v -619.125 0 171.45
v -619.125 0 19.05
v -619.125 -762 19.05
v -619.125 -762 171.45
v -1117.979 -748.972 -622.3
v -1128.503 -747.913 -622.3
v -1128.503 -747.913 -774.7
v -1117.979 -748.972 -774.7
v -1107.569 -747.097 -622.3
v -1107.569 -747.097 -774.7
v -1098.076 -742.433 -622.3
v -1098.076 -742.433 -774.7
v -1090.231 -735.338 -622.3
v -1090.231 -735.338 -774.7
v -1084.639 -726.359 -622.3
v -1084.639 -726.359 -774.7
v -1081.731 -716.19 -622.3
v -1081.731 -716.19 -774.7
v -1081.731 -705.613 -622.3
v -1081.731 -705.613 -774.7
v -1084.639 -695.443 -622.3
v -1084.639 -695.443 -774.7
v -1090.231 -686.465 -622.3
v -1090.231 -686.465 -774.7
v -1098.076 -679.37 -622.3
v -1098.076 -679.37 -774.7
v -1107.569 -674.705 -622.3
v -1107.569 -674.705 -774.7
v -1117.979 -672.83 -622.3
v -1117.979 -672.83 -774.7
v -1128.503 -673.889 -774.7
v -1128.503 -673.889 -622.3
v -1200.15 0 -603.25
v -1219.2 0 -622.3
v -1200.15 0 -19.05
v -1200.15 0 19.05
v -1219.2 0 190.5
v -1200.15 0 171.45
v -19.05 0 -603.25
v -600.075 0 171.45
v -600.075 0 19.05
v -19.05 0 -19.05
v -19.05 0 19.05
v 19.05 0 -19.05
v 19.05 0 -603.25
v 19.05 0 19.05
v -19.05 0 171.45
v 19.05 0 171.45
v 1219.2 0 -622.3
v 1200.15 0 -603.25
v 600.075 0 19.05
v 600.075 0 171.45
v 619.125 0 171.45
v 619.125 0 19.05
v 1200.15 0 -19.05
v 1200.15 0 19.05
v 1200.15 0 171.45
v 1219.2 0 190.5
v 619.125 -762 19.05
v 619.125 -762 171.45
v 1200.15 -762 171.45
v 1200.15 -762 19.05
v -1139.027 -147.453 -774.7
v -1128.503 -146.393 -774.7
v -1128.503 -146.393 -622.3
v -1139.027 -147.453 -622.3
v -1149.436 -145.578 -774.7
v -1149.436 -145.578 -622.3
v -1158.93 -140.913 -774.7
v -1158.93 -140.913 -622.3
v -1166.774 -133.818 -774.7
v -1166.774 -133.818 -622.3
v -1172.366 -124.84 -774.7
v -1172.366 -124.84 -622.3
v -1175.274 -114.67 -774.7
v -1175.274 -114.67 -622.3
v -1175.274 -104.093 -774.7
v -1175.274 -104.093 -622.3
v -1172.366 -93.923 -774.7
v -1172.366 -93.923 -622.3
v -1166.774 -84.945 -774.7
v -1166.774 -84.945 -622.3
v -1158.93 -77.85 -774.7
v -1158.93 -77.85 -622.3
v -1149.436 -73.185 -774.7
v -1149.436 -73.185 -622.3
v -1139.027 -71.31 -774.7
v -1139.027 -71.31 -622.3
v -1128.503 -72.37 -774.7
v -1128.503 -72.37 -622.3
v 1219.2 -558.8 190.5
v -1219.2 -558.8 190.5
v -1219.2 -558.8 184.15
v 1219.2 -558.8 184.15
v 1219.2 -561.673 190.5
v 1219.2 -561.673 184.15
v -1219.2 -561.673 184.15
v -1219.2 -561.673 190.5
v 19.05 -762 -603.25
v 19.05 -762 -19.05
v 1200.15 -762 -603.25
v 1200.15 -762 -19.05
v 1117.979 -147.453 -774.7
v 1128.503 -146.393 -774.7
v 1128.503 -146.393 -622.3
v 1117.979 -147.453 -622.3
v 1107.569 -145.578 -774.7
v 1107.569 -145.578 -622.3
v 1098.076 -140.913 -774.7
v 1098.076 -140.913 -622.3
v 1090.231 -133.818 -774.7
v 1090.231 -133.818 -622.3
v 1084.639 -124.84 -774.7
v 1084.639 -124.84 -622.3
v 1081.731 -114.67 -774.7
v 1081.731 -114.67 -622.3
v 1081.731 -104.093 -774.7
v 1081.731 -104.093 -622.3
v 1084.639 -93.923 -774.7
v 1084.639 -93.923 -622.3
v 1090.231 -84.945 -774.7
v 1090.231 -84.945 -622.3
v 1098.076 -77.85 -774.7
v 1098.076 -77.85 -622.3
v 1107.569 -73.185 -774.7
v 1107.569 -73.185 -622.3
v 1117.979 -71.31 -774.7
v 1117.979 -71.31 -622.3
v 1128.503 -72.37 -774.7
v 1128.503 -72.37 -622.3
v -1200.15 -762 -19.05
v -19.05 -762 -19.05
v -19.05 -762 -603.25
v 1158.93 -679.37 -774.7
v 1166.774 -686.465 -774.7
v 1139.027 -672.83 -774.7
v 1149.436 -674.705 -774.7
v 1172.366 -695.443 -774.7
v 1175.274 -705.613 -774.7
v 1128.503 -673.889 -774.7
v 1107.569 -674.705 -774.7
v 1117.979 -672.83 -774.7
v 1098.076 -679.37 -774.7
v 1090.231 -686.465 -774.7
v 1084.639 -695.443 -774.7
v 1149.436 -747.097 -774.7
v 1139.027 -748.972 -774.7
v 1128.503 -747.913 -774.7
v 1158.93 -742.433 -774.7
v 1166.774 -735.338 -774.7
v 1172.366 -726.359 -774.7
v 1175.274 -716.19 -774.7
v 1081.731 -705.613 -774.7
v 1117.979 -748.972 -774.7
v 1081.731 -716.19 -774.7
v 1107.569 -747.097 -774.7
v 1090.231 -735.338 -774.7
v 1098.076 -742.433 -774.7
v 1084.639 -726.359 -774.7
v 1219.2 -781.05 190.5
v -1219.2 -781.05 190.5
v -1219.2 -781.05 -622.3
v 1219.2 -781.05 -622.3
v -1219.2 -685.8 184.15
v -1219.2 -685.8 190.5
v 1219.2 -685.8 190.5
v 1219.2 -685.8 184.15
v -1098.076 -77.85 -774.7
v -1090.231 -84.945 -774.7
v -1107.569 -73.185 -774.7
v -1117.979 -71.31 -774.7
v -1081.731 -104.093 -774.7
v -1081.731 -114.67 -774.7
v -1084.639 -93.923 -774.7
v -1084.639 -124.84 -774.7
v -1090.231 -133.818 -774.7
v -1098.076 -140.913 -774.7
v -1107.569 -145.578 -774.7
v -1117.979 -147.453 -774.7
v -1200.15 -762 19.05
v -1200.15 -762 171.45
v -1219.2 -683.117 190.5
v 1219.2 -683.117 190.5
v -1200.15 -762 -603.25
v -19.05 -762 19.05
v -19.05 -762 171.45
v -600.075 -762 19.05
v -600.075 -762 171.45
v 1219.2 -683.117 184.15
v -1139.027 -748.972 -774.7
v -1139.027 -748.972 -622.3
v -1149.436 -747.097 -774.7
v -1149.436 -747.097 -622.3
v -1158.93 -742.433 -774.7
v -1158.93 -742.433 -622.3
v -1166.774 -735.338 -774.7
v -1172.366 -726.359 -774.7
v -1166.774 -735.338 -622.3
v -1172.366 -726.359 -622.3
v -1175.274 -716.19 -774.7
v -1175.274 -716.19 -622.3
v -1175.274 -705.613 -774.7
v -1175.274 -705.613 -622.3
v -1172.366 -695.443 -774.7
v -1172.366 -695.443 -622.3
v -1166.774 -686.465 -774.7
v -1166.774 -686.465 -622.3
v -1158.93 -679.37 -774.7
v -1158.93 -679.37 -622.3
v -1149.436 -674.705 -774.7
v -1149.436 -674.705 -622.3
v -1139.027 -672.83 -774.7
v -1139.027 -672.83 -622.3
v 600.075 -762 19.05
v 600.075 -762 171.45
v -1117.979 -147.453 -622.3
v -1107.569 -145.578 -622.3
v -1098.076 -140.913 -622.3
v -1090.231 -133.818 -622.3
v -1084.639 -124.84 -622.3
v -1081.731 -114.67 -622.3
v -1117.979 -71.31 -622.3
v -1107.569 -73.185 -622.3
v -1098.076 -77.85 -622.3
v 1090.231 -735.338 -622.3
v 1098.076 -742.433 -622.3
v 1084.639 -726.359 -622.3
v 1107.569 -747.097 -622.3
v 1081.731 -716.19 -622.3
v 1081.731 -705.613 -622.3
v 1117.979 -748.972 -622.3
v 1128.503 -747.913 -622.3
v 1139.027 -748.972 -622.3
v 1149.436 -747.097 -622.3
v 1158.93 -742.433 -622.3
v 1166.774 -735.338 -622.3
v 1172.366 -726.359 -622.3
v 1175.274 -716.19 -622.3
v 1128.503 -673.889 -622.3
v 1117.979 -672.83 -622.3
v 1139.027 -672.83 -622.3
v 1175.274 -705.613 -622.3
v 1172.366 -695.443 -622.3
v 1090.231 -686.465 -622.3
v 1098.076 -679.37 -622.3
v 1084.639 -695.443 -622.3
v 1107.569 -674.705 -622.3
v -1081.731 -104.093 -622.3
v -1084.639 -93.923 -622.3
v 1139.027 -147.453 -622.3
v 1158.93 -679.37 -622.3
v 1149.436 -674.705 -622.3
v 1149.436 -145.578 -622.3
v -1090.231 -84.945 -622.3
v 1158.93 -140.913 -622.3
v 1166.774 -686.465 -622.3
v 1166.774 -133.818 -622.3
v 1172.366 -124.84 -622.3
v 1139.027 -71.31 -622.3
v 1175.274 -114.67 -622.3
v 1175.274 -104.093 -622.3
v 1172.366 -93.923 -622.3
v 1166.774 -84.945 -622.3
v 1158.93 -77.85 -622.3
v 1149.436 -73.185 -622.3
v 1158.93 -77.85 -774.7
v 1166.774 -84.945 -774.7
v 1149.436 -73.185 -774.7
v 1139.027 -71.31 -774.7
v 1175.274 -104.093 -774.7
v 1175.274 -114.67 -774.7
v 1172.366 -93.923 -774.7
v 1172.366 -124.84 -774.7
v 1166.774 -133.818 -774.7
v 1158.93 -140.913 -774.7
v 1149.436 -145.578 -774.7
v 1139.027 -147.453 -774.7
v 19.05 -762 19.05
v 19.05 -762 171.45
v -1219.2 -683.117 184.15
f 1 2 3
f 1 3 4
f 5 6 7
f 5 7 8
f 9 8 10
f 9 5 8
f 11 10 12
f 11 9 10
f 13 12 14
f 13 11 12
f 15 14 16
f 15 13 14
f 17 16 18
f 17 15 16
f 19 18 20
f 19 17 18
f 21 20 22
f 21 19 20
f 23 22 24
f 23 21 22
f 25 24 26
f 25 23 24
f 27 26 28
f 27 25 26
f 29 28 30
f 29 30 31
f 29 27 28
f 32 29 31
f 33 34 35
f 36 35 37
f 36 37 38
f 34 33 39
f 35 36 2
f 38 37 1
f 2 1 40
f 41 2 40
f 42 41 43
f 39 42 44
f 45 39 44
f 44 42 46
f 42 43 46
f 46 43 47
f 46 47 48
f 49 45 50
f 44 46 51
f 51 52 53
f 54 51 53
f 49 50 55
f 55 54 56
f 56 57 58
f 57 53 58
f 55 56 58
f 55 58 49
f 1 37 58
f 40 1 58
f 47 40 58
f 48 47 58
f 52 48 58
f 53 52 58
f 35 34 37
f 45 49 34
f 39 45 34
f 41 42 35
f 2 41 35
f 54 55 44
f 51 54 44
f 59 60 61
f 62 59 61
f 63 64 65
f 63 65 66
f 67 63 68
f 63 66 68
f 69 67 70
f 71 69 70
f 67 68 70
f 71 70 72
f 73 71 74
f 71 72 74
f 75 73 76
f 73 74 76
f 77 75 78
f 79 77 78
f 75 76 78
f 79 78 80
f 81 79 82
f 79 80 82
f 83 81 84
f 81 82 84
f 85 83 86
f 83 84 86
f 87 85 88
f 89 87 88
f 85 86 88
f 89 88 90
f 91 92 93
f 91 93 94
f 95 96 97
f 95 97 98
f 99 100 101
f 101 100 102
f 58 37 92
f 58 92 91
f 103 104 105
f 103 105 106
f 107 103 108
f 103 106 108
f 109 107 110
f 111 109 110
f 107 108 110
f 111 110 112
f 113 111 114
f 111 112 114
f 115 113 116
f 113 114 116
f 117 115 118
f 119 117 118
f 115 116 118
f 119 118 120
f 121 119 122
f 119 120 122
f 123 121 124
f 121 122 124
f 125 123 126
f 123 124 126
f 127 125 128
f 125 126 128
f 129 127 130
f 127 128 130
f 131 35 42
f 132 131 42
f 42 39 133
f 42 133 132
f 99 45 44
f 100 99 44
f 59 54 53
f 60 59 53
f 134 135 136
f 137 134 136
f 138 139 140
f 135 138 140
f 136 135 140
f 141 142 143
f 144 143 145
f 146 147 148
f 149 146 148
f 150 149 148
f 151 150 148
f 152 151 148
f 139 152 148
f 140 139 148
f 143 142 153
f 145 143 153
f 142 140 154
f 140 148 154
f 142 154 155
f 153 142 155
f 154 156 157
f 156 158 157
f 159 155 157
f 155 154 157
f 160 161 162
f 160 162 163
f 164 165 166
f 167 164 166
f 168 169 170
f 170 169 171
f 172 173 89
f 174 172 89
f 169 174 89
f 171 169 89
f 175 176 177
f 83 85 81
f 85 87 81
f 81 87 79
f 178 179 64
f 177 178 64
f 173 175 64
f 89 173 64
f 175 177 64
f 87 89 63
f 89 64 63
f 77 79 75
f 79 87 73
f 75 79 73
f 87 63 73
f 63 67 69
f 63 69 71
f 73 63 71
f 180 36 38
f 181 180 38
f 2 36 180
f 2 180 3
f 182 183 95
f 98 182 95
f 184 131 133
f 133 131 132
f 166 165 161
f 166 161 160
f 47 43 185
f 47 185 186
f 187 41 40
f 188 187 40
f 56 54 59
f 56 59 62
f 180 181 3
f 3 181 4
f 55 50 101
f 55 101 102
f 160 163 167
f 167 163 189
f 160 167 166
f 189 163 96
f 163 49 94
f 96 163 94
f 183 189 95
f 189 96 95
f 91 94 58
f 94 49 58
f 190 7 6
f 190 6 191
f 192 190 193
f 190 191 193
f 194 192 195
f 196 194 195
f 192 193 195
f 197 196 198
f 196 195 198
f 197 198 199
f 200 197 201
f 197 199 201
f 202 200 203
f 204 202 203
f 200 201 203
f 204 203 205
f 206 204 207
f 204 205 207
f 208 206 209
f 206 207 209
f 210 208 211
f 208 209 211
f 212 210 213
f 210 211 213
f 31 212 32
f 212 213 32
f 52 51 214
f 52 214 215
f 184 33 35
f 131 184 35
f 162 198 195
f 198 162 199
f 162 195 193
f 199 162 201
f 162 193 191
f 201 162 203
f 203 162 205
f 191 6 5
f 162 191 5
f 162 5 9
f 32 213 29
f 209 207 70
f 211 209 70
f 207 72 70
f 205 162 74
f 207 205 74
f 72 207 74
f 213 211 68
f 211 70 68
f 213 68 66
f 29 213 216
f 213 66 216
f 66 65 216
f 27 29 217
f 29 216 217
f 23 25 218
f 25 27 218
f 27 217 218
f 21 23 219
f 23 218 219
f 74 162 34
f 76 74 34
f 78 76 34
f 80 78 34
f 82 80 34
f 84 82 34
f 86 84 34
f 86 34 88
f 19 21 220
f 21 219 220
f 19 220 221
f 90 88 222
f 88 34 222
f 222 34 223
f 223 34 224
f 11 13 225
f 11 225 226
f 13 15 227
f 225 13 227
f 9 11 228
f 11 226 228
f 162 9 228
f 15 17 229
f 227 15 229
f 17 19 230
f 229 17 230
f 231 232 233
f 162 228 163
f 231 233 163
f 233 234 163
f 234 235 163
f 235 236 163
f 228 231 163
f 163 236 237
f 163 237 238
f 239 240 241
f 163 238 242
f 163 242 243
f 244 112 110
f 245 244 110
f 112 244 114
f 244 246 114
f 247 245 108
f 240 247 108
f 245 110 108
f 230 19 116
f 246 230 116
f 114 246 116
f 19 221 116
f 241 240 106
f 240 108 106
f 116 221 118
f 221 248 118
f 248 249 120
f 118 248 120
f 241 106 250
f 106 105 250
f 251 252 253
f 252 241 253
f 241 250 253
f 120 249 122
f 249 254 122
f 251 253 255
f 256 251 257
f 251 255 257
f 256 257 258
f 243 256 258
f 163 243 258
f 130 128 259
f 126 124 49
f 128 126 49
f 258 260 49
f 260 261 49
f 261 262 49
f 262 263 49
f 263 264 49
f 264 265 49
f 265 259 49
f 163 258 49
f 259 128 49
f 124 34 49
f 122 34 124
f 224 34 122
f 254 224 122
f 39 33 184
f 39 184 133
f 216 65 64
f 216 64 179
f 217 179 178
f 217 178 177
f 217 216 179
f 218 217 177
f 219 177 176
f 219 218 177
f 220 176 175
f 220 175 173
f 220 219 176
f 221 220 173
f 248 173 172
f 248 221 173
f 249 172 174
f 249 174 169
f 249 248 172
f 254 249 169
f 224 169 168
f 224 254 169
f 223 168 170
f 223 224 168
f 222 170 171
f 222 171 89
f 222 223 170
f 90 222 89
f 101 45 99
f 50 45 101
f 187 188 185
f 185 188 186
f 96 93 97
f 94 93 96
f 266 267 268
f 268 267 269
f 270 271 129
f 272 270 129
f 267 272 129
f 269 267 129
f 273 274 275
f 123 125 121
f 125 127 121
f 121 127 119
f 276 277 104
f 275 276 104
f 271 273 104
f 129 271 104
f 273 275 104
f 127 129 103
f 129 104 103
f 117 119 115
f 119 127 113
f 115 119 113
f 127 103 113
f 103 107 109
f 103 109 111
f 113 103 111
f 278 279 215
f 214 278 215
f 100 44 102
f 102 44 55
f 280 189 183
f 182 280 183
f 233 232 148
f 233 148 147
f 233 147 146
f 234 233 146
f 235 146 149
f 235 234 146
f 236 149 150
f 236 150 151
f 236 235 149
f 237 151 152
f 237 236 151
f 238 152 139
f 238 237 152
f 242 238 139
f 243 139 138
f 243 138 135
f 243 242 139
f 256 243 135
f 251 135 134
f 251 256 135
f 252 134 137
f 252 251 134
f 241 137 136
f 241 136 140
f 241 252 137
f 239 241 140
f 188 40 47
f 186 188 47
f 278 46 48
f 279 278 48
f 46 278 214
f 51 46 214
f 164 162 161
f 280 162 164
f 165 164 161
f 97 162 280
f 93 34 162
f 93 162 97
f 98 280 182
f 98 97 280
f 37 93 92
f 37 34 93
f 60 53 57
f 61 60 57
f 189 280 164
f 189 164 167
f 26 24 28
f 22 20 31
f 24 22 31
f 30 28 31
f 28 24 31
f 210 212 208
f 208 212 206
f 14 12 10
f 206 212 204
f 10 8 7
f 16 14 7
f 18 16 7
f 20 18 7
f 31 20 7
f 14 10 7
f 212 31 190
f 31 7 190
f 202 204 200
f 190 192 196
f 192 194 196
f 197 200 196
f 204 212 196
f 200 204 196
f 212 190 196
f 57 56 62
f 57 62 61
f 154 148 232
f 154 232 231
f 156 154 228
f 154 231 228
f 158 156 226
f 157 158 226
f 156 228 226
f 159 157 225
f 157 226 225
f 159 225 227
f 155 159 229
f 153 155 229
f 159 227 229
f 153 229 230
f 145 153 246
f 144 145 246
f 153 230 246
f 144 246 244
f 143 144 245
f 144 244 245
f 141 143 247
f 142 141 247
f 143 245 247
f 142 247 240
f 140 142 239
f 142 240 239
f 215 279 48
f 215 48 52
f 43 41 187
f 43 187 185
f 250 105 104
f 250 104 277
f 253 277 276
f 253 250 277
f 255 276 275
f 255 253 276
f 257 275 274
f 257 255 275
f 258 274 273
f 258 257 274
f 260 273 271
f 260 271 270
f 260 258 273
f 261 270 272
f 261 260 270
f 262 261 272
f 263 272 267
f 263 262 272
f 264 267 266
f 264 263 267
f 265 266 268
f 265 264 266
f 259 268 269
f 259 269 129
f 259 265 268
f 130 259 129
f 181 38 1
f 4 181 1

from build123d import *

# Parameters (mm, degrees)
F0_W      = 1219.2
F0_H      = 190.5
F0_W_2    = 1181.1
F0_H_2    = 152.4
F1_DEPTH  = 762
F2_W      = 1219.2
F2_H      = 190.5
F2_W_2    = 1181.1
F2_H_2    = 152.4
F3_DEPTH  = 762
F4_W      = 1219.2
F4_H      = 622.3
F4_W_2    = 1181.1
F4_H_2    = 584.2
F5_DEPTH  = 762
F6_W      = 1219.2
F6_H      = 622.3
F6_W_2    = 1181.1
F6_H_2    = 584.2
F7_DEPTH  = 762
F8_W      = 2438.4
F8_H      = 127
F9_DEPTH  = 6.35
F10_W     = 2438.4
F10_H     = 812.8
F11_DEPTH = 19.05
F12_R     = 38.1
F13_DEPTH = 152.4
F14_W     = 19.05
F14_H     = 152.4
F15_DEPTH = 762
F17_W     = 121.444046
F17_H     = 6.35
F18_DEPTH = 2438.4


with BuildPart() as f1:
    # F0 (on Front) → F1 (new body)
    with BuildSketch(Plane.XZ):
        with Locations((-609.6, 95.25)):
            Rectangle(F0_W, F0_H)
        with Locations((-609.6, 95.25)):
            Rectangle(F0_W_2, F0_H_2, mode=Mode.SUBTRACT)
    extrude(amount=F1_DEPTH)

    # F2 (on Front) → F3 (join)
    with BuildSketch(Plane.XZ):
        with Locations((609.6, 95.25)):
            Rectangle(F2_W, F2_H)
        with Locations((609.6, 95.25)):
            Rectangle(F2_W_2, F2_H_2, mode=Mode.SUBTRACT)
    extrude(amount=F3_DEPTH)

    # F4 (on Front) → F5 (join)
    with BuildSketch(Plane.XZ):
        with Locations((-609.6, -311.15)):
            Rectangle(F4_W, F4_H)
        with Locations((-609.6, -311.15)):
            Rectangle(F4_W_2, F4_H_2, mode=Mode.SUBTRACT)
    extrude(amount=F5_DEPTH)

    # F6 (on Front) → F7 (join)
    with BuildSketch(Plane.XZ):
        with Locations((609.6, -311.15)):
            Rectangle(F6_W, F6_H)
        with Locations((609.6, -311.15)):
            Rectangle(F6_W_2, F6_H_2, mode=Mode.SUBTRACT)
    extrude(amount=F7_DEPTH)

    # F8 (on face) → F9 (cut)
    with BuildSketch(Plane.XY.offset(190.5)):
        with Locations((0, -622.3)):
            Rectangle(F8_W, F8_H)
    extrude(amount=-F9_DEPTH, mode=Mode.SUBTRACT)

    # F10 (on face) → F11 (join)
    with BuildSketch(Plane.XZ.offset(762)):
        with Locations((0, -215.9)):
            Rectangle(F10_W, F10_H)
    extrude(amount=F11_DEPTH)

    # F12 (on face) → F13 (join)
    with BuildSketch(Plane(origin=(0, 0, -622.3), x_dir=(1, 0, 0), z_dir=(0, 0, -1))):
        with Locations((1119.462132, 109.381564)):
            Circle(F12_R)
        with Locations((-1137.543082, 710.901141)):
            Circle(F12_R)
        with Locations((1119.462132, 710.901141)):
            Circle(F12_R)
        with Locations((-1137.543082, 109.381564)):
            Circle(F12_R)
    extrude(amount=F13_DEPTH)

    # F14 (on face) → F15 (join, through all)
    with BuildSketch(Plane(origin=(0, 0, 0), x_dir=(-1, 0, 0), z_dir=(0, 1, 0))):
        with Locations((-609.6, 95.25)):
            Rectangle(F14_W, F14_H)
    extrude(amount=-F15_DEPTH)

    # F16: F1 across plane


with BuildPart() as f1_1:
    add(f1.part)
    add(f1.part.mirror(Plane.YZ))

    # F17 (on face) → F18 (join, through all)
    with BuildSketch(Plane.YZ.offset(1219.2)):
        with Locations((-622.395009, 187.325)):
            Rectangle(F17_W, F17_H)
    extrude(amount=-F18_DEPTH)


solid = f1_1.part
